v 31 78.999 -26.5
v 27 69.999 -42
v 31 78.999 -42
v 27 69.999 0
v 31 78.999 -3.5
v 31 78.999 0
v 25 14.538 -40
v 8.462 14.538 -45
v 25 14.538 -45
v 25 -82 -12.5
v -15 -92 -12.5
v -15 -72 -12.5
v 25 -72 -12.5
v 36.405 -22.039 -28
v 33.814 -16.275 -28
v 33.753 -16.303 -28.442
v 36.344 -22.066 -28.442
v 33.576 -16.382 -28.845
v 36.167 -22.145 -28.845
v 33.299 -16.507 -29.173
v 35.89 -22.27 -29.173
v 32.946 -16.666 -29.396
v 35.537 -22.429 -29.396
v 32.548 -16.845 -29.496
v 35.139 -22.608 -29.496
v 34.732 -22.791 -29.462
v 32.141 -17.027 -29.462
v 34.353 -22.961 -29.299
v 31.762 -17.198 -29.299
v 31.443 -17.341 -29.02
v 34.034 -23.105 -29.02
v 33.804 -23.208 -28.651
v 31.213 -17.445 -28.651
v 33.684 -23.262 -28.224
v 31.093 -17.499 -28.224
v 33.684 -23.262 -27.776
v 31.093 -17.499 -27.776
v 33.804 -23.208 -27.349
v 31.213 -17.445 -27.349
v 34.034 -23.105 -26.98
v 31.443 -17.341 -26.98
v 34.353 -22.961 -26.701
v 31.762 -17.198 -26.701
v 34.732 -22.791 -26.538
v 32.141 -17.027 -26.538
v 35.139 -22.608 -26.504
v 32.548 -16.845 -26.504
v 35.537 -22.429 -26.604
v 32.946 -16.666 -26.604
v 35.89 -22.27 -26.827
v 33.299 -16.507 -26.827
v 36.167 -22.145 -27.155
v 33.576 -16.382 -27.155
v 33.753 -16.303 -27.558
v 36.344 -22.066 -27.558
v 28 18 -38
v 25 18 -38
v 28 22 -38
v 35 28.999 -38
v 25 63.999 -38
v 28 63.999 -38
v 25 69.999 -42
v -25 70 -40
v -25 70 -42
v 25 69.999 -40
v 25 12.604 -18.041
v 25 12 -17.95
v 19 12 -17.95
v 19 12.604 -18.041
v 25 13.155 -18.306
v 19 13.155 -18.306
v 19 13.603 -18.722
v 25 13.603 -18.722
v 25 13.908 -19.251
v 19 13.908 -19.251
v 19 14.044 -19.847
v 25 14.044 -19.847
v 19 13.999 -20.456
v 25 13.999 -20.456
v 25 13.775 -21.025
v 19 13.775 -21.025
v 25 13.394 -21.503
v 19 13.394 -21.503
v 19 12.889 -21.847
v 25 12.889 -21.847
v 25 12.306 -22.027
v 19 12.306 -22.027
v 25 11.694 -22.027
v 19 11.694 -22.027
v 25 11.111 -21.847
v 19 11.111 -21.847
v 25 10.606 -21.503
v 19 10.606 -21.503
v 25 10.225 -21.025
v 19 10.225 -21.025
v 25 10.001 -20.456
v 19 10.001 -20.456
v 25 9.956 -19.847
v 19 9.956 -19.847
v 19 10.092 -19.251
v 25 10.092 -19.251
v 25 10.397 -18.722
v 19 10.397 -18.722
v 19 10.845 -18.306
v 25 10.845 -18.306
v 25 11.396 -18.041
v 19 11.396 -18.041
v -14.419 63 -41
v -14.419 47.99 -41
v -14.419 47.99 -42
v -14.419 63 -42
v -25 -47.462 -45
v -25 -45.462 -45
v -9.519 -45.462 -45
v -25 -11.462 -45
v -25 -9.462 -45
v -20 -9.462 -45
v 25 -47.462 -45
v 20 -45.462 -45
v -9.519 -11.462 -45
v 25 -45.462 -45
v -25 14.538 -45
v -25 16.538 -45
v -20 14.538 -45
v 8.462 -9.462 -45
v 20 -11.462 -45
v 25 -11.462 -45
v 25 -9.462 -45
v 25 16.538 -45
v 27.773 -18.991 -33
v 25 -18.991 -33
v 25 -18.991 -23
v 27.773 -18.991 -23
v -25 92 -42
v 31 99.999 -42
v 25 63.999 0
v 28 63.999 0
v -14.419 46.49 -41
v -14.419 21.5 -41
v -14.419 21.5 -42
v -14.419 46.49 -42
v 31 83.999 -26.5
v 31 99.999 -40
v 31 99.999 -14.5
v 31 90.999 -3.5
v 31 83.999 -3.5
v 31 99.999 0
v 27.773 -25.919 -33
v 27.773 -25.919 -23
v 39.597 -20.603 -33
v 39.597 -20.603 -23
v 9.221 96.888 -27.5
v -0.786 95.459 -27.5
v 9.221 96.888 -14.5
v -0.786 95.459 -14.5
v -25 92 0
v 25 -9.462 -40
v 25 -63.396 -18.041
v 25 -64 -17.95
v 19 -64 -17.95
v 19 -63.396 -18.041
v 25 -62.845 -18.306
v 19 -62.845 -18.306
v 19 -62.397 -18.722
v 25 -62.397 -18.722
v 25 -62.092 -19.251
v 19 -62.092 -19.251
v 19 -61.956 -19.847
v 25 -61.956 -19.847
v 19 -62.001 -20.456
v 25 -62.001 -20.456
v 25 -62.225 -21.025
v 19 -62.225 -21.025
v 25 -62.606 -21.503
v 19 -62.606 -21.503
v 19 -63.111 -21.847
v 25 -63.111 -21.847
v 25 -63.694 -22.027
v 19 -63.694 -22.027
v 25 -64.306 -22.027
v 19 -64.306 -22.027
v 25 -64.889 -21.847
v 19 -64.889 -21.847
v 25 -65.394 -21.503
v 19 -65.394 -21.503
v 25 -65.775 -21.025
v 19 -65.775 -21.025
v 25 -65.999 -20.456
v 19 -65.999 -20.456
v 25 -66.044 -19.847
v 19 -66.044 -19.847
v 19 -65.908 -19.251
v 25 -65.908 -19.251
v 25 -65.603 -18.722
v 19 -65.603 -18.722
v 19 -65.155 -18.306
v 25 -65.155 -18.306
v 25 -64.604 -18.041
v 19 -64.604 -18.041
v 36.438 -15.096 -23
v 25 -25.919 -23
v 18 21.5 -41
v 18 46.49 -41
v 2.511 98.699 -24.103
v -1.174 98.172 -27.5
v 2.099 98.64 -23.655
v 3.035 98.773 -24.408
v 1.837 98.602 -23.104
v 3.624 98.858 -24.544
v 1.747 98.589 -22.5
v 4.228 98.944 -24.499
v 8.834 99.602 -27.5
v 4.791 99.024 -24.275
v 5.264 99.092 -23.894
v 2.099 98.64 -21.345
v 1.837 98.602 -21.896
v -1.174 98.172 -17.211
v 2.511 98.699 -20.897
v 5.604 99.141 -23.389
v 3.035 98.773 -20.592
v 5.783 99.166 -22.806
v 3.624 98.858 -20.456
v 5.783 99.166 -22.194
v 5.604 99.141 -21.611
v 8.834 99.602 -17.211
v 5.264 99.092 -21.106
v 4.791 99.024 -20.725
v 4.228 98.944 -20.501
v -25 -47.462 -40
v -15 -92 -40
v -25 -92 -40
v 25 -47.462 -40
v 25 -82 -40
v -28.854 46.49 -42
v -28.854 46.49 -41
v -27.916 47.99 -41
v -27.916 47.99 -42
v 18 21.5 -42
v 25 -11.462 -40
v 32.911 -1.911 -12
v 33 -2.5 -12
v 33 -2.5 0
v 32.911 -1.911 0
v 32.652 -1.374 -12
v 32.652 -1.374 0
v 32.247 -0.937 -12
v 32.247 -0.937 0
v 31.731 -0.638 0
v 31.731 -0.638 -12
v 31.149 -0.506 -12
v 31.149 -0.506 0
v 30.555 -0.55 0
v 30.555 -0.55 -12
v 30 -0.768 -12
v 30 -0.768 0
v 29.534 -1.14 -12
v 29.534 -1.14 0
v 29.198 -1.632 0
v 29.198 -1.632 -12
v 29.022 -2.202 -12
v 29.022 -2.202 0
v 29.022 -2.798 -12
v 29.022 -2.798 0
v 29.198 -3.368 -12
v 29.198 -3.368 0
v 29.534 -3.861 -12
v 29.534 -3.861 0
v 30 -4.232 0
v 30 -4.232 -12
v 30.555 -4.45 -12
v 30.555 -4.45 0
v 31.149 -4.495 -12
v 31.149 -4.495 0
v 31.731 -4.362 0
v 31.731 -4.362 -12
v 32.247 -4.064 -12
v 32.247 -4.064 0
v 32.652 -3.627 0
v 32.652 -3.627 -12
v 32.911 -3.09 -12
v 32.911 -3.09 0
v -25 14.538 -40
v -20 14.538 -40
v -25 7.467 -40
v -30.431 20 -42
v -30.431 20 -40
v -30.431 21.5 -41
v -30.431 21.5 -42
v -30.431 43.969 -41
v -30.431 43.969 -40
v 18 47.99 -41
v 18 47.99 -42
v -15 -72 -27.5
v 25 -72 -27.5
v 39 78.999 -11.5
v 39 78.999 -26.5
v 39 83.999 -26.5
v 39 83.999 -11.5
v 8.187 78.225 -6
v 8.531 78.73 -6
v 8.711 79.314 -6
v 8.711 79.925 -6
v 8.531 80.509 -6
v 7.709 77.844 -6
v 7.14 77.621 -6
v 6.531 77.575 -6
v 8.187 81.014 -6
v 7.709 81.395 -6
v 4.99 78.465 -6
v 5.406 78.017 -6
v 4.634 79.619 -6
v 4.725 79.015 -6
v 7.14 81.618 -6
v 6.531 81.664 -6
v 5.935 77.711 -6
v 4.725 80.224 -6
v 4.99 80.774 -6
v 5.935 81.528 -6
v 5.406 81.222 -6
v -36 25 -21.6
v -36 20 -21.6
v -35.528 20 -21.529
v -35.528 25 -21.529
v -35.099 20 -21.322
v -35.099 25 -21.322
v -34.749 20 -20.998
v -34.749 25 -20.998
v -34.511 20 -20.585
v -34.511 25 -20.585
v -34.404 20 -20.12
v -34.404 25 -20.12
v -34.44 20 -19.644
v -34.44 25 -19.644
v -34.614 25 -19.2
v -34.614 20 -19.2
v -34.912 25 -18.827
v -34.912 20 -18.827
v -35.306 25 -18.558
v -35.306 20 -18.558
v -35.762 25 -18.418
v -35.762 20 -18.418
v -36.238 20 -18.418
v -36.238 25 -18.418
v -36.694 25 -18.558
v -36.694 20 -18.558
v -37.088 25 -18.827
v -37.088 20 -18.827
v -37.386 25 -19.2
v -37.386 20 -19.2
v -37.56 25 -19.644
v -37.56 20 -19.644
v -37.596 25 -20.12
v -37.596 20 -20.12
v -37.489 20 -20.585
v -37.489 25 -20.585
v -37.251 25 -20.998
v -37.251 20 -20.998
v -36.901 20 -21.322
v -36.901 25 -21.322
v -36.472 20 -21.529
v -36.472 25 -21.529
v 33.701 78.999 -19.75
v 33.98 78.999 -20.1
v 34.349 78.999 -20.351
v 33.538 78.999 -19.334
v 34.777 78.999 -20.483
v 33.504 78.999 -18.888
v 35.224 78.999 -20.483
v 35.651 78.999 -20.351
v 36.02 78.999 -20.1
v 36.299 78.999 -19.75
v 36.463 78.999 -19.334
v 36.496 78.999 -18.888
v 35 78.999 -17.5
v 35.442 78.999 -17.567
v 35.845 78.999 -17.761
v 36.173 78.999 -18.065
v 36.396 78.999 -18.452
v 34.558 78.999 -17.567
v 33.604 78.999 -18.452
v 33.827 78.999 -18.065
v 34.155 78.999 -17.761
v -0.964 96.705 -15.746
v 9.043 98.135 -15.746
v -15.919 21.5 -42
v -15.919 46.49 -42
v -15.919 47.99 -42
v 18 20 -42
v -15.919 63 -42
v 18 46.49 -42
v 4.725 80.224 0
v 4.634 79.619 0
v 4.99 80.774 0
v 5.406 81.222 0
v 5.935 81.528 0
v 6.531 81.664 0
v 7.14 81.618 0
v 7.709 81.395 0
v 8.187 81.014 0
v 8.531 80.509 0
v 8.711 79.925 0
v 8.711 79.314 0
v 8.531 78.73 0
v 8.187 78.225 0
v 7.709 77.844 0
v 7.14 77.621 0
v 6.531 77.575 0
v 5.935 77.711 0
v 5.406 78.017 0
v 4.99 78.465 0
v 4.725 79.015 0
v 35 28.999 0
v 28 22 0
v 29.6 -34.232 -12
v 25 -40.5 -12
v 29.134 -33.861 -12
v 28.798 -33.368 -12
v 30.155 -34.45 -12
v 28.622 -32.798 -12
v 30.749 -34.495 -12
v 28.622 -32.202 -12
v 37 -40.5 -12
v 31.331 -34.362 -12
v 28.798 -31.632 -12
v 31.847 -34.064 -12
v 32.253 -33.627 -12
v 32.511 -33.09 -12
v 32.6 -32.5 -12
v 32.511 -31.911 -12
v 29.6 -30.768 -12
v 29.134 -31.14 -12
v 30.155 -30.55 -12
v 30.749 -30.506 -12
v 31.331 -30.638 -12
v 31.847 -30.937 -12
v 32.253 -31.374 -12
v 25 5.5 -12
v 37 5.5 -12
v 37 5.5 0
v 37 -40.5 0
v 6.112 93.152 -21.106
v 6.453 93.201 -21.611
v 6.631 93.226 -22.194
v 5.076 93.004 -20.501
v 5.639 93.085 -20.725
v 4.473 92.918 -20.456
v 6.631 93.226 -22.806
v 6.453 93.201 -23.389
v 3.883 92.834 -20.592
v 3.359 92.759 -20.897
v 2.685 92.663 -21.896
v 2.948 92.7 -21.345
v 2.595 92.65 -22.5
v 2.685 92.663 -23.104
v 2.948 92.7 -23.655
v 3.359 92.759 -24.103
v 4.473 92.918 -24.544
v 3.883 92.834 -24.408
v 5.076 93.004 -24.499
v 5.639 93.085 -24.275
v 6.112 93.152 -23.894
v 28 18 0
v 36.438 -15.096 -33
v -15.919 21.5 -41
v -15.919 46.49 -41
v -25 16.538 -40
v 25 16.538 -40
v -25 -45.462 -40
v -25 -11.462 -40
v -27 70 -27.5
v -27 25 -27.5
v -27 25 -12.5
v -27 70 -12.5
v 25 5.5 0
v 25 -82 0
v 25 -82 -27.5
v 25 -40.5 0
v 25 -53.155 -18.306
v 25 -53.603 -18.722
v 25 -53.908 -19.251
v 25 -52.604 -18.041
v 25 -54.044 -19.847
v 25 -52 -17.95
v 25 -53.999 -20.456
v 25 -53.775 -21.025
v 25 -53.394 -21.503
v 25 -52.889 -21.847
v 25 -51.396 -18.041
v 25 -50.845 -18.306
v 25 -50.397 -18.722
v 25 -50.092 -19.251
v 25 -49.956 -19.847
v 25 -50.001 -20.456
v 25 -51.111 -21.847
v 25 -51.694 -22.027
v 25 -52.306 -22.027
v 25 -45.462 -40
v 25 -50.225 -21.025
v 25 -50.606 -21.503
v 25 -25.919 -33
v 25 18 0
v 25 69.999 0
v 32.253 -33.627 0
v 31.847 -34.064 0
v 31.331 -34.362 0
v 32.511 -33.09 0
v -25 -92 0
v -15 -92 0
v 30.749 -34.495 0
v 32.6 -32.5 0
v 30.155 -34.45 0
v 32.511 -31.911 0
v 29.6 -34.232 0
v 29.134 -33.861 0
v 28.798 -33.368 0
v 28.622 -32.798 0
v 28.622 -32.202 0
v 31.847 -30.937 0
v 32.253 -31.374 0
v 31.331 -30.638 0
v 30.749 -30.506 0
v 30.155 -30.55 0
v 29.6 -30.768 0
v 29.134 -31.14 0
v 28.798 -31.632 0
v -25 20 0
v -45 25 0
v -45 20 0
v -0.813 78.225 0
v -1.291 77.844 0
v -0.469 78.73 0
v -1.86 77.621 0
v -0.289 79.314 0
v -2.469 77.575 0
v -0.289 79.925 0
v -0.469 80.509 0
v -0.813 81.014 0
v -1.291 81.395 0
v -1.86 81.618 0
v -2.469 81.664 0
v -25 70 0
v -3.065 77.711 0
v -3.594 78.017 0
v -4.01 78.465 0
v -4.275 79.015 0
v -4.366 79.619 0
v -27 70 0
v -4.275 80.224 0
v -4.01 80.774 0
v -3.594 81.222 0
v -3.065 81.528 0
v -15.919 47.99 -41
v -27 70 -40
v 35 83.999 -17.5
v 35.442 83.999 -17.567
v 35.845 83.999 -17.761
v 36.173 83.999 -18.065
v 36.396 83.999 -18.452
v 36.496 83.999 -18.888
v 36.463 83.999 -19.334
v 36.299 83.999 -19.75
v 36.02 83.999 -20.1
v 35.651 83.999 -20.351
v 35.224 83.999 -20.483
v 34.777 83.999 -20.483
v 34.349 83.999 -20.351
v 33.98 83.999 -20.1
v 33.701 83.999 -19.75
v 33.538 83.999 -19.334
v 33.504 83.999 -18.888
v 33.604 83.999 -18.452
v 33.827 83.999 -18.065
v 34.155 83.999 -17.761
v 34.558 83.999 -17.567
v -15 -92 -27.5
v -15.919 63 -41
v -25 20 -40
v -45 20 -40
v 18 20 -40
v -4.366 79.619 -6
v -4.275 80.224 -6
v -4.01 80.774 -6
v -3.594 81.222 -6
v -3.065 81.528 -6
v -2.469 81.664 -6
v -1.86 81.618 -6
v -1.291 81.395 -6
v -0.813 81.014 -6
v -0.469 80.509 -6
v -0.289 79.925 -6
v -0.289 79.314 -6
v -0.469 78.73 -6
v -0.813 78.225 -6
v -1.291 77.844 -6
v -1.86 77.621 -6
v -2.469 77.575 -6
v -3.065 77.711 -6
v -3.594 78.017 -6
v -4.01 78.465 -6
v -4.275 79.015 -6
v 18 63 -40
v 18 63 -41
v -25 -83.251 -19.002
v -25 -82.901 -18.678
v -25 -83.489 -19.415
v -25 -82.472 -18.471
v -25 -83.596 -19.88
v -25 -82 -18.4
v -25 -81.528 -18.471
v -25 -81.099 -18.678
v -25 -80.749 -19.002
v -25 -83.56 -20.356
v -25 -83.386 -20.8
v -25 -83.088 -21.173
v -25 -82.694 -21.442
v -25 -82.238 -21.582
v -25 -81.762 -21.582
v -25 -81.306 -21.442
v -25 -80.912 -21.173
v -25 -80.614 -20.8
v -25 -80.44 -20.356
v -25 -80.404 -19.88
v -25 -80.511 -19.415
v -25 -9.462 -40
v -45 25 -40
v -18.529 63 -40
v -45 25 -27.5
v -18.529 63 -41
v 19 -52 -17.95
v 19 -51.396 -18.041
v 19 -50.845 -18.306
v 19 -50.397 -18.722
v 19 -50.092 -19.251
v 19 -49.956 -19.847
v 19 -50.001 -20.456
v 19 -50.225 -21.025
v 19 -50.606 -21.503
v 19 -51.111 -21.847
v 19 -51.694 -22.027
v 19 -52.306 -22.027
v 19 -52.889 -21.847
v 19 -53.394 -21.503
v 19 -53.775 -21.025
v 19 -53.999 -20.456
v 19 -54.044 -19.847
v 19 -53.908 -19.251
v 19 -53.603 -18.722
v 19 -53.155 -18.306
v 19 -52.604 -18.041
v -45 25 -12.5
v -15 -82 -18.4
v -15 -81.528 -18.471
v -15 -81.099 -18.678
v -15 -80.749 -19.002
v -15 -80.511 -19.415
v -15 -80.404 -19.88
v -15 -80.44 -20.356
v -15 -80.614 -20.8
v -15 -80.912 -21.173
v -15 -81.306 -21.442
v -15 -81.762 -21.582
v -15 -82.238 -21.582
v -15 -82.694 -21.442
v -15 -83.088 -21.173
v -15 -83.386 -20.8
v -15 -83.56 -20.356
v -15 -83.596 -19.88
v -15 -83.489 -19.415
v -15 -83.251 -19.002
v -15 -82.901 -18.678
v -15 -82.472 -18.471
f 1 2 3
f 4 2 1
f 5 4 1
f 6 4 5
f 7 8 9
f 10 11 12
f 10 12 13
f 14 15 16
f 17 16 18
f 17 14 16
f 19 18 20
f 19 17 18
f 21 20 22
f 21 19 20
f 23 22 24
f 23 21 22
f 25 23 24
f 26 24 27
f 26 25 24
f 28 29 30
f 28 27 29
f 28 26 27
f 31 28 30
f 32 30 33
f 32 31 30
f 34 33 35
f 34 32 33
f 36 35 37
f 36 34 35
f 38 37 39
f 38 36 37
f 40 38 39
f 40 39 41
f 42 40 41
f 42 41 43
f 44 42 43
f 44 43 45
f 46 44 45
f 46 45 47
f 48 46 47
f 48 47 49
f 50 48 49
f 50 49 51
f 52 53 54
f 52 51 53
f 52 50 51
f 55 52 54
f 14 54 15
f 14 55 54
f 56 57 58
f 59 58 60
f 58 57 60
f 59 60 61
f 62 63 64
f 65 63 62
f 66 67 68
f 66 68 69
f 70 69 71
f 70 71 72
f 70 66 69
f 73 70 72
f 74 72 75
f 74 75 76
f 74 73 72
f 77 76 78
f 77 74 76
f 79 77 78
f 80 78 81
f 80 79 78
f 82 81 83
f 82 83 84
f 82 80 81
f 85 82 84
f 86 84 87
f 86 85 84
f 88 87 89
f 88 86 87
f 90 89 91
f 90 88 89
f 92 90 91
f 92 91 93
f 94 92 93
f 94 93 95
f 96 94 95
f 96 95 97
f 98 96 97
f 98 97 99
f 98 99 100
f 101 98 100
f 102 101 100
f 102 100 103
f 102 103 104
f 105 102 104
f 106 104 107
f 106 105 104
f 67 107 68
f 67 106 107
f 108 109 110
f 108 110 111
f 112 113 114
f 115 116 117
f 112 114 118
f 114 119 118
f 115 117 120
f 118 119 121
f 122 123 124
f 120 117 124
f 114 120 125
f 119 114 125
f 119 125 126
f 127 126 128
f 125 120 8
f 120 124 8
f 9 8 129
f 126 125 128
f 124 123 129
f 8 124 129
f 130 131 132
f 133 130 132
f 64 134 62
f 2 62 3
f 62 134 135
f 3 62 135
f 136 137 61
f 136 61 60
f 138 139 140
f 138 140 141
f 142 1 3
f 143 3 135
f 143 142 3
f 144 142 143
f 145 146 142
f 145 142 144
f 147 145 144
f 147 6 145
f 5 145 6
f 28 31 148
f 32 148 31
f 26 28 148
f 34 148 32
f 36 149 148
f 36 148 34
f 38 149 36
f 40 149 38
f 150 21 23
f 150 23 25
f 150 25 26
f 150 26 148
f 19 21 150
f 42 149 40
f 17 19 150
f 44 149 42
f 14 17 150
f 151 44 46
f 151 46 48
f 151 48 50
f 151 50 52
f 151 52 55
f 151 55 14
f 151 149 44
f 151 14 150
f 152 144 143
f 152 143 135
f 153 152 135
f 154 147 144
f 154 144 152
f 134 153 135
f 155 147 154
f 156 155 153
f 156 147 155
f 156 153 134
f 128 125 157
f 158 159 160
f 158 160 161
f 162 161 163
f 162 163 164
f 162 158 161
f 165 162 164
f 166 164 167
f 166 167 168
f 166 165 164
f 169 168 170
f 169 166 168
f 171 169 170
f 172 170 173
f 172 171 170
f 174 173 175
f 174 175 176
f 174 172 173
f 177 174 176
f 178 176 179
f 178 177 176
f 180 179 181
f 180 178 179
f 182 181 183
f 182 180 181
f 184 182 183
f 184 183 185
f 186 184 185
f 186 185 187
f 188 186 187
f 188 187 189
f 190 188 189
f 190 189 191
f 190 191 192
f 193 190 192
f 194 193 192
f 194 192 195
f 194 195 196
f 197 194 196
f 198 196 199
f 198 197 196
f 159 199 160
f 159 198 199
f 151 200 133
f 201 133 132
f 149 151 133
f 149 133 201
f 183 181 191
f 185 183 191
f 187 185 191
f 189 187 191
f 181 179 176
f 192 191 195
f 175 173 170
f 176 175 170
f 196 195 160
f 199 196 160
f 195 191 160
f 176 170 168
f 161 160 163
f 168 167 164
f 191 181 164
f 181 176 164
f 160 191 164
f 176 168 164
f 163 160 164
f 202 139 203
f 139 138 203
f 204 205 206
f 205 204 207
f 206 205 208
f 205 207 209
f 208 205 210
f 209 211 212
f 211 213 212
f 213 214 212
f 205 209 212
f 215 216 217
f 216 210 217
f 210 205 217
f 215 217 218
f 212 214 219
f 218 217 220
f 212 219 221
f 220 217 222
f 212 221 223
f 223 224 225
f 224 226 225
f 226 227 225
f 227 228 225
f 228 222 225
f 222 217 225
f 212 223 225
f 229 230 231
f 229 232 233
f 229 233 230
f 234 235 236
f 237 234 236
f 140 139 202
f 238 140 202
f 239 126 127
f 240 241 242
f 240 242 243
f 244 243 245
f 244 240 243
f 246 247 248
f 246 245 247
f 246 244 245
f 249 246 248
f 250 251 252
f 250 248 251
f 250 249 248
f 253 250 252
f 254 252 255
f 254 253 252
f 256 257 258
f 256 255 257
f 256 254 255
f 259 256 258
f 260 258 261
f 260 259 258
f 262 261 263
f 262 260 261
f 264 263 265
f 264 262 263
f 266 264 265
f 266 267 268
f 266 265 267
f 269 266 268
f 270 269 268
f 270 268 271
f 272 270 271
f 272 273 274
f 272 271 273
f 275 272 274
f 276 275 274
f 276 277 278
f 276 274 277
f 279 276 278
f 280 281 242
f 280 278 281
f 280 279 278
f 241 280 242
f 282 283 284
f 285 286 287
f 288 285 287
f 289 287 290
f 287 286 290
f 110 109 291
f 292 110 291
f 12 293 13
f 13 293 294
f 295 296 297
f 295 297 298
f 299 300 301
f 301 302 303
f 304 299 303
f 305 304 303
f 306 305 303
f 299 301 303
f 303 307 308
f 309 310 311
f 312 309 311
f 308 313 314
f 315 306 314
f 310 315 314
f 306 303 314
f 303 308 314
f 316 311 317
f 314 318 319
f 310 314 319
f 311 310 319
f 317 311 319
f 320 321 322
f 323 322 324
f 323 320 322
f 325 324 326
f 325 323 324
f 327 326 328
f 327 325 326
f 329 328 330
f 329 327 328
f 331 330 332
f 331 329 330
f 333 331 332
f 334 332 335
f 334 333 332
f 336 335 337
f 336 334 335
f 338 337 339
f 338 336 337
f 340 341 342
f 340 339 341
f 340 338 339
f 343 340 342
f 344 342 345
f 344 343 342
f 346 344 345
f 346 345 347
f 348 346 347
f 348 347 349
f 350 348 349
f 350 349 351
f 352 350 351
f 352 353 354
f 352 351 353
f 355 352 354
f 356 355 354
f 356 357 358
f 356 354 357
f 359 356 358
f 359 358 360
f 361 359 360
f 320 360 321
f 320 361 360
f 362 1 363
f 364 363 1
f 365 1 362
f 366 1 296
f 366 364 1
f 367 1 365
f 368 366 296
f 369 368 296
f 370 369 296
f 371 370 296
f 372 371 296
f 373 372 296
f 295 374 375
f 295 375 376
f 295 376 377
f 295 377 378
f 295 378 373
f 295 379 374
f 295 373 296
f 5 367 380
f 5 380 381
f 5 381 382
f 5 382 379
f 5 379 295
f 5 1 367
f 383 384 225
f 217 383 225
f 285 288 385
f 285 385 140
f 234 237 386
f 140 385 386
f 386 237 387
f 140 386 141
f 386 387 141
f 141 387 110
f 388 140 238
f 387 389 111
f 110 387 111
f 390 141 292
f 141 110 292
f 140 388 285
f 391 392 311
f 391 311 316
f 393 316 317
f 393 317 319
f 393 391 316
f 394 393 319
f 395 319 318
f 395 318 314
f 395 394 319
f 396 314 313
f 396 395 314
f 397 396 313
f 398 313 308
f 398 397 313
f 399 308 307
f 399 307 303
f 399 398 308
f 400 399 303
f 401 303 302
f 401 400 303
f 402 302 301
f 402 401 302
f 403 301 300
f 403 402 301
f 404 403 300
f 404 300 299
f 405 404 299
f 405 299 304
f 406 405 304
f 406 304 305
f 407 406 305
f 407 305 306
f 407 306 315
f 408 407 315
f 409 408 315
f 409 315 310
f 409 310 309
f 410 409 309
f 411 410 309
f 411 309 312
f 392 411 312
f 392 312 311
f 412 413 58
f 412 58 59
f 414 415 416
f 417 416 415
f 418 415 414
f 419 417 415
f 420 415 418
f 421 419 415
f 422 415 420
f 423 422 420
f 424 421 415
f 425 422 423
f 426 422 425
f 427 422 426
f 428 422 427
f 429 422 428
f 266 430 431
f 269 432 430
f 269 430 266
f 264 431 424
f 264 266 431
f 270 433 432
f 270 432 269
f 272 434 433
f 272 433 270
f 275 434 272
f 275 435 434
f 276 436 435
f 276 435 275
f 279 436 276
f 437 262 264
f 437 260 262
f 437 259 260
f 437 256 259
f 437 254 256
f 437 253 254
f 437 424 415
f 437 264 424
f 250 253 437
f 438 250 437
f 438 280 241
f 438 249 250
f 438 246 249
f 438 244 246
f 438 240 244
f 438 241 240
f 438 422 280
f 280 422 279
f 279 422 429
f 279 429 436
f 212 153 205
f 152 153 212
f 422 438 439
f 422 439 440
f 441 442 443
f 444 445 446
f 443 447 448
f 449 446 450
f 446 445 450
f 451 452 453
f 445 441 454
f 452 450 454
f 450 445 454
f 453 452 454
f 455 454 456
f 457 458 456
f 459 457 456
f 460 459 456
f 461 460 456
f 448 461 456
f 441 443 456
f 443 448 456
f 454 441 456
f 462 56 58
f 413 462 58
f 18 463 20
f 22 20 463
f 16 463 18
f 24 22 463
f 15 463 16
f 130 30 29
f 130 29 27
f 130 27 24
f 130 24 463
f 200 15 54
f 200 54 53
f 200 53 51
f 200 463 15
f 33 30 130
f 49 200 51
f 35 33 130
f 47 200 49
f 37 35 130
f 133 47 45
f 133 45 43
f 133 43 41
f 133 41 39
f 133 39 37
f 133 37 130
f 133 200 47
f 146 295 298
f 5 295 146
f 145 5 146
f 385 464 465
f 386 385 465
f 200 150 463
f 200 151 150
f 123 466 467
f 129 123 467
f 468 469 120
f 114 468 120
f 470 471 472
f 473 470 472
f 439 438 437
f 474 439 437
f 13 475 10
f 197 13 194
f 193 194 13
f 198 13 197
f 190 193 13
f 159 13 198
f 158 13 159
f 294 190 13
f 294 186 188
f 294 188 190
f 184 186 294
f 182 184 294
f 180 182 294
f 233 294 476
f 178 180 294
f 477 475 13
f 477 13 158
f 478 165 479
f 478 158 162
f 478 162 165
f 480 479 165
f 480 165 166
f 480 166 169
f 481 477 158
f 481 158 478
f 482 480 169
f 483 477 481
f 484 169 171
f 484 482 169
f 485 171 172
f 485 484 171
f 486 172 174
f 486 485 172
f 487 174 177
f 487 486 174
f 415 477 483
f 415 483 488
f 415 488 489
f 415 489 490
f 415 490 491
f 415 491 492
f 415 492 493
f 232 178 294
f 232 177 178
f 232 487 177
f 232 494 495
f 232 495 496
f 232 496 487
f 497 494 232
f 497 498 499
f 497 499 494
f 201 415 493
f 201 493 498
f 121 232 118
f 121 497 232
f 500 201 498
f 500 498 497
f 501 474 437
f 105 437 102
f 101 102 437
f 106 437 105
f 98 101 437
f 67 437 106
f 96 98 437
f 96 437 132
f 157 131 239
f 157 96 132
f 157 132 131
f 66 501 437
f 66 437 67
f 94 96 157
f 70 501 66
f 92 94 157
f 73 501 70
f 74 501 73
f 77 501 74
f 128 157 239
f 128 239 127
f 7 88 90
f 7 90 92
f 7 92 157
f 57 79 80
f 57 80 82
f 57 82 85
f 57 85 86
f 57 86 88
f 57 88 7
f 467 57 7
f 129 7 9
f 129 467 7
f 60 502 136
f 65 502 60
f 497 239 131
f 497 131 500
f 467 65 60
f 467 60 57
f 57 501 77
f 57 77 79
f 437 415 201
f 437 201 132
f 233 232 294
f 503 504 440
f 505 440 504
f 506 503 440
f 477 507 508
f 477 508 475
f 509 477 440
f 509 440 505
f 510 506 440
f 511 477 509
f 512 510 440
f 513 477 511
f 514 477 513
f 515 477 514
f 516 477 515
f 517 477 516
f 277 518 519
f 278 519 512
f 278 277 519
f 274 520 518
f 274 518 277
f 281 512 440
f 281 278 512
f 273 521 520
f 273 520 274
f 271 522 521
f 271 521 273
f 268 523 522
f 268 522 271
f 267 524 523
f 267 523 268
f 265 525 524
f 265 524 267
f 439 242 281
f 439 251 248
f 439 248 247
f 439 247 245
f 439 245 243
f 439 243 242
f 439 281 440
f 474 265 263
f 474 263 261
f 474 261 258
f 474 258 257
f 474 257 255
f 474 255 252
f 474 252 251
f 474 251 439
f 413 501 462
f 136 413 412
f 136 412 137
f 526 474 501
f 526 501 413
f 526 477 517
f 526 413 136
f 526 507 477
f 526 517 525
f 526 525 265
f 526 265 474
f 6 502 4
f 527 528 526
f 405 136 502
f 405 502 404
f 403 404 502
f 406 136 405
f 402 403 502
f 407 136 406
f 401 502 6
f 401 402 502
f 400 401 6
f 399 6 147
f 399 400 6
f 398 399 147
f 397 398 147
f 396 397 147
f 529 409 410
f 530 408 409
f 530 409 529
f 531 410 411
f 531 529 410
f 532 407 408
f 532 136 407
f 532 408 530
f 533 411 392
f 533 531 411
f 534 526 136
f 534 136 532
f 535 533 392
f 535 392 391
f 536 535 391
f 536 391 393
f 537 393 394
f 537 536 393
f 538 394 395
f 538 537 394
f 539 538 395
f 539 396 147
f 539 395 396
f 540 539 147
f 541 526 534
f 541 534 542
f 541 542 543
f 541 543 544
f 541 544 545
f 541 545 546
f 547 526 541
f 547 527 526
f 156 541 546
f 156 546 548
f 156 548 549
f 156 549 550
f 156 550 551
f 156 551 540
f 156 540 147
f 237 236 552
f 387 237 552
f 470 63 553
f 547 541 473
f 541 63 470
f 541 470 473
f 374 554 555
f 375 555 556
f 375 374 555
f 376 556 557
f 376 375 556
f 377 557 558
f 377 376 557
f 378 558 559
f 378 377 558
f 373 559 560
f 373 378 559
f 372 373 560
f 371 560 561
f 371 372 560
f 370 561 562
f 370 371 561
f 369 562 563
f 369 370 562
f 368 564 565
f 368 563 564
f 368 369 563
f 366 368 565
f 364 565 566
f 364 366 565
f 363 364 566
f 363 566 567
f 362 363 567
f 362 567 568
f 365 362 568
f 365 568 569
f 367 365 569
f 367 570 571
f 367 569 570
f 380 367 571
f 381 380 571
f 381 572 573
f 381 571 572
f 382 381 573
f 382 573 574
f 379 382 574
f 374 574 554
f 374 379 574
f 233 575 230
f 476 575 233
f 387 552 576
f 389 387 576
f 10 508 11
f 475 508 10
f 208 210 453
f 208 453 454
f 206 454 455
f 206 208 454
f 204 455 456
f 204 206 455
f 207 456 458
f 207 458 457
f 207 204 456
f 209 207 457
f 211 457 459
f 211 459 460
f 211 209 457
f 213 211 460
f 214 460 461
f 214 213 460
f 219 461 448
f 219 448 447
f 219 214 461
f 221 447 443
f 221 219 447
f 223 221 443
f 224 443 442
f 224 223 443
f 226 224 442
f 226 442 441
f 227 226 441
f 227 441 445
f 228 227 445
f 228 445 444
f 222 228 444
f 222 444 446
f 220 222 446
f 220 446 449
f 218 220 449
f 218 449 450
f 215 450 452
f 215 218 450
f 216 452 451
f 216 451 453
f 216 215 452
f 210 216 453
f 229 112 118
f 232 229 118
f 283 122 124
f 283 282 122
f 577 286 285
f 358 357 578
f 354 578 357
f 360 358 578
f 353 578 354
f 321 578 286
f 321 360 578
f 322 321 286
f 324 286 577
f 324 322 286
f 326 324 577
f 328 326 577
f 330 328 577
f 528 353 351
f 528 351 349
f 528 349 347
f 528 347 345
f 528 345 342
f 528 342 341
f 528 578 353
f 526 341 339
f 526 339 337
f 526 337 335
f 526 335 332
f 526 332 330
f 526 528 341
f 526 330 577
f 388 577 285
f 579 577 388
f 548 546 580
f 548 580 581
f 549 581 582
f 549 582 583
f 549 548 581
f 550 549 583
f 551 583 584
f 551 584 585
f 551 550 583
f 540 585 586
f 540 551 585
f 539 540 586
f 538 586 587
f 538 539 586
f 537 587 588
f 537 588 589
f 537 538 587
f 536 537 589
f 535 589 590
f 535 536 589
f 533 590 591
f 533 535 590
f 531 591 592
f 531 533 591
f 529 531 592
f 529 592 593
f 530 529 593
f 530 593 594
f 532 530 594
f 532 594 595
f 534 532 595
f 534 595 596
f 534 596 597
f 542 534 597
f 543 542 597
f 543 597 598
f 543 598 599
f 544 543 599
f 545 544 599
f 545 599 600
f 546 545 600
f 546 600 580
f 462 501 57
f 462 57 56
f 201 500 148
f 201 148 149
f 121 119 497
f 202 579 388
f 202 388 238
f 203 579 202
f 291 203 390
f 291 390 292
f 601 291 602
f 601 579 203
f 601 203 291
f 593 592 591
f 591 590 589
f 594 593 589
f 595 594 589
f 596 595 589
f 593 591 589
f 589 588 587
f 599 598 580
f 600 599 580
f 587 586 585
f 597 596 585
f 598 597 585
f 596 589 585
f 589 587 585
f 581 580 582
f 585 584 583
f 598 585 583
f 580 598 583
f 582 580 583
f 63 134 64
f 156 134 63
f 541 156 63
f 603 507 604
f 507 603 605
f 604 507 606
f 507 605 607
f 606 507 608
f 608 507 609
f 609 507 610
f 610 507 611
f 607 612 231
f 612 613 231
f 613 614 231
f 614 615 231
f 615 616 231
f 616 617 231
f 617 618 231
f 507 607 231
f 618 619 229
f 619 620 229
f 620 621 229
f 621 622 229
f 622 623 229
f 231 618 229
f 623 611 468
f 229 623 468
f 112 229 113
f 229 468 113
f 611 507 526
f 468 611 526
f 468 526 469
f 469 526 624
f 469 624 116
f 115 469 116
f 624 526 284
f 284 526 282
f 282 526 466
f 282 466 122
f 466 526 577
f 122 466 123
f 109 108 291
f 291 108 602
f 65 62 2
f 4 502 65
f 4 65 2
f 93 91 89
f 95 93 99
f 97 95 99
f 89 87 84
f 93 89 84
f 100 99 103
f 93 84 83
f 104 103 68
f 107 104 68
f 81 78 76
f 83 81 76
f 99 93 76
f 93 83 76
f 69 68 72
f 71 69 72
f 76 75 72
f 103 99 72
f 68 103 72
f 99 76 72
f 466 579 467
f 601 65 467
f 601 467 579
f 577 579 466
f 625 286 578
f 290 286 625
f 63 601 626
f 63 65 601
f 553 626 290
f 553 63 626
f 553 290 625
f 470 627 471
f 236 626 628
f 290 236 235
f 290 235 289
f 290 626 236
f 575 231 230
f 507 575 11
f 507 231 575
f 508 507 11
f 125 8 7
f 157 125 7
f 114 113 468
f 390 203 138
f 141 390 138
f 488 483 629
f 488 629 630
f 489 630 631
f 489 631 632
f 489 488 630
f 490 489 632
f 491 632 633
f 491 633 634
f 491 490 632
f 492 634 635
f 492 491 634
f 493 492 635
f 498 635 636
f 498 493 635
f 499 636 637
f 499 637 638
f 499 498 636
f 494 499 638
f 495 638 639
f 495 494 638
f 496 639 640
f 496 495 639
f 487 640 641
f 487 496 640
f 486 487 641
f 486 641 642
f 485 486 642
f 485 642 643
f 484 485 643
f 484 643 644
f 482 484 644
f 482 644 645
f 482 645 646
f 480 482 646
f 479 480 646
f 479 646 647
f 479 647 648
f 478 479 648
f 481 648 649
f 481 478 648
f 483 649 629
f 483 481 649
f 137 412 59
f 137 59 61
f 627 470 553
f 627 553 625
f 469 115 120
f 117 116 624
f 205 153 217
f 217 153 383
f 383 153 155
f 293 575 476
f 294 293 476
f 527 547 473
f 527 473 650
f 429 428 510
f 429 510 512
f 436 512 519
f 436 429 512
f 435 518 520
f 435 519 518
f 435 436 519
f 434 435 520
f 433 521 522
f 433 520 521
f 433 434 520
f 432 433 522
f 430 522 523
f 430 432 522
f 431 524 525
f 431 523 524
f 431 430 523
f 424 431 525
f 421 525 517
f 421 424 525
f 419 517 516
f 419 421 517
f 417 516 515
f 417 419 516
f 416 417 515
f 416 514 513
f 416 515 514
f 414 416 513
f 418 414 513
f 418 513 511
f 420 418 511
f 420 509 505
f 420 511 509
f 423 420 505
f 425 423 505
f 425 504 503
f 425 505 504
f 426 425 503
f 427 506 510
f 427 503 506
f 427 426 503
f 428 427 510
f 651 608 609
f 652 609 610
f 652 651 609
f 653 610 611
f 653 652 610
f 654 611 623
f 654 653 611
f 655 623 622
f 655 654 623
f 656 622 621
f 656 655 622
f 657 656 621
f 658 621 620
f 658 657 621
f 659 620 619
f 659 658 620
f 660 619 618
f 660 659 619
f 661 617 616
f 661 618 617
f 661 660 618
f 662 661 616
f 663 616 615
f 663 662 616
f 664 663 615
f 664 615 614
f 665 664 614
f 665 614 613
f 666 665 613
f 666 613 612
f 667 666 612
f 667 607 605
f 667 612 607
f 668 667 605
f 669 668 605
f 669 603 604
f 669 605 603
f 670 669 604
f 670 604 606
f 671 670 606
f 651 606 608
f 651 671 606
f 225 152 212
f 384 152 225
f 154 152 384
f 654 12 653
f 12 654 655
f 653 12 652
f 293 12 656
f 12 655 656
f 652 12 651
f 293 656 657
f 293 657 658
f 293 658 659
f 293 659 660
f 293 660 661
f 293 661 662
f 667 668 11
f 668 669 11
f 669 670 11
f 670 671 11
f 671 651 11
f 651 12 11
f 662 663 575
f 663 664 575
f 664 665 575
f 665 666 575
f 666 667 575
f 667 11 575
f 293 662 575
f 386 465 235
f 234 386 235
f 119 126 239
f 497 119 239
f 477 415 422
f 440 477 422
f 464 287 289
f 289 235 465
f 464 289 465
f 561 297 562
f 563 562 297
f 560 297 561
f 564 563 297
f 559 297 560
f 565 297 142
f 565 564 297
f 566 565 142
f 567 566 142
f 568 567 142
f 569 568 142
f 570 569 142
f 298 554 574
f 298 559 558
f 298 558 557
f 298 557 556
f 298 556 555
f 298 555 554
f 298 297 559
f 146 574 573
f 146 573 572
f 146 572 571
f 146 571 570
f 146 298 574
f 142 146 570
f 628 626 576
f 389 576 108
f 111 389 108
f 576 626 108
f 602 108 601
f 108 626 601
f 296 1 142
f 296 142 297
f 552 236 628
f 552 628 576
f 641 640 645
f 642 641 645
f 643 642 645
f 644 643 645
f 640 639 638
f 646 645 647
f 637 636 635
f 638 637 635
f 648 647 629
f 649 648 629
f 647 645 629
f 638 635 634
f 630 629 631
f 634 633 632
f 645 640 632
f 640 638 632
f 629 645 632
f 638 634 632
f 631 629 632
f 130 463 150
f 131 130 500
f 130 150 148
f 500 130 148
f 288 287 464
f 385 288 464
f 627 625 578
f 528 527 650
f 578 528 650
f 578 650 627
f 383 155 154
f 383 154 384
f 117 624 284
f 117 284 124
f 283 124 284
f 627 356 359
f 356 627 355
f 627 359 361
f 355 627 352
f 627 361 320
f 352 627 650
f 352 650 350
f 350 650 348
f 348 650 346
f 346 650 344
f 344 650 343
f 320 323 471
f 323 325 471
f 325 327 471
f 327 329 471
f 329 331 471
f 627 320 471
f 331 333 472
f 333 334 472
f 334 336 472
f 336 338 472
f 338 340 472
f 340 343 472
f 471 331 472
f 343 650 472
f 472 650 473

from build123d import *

# Parameters (mm, degrees)
CROQUIS1_W                  = 50
CROQUIS1_H                  = 184
SALIENTE_EXTRUIR1_DEPTH     = 40
CORTAR_EXTRUIR1_DEPTH       = 40
CROQUIS3_R                  = 2
SALIENTE_EXTRUIR2_DEPTH     = 40
SALIENTE_EXTRUIR3_DEPTH     = 38
SALIENTE_EXTRUIR4_DEPTH     = 40
CROQUIS9_W                  = 28
CROQUIS9_H                  = 46
CORTAR_EXTRUIR6_DEPTH       = 12
CORTAR_EXTRUIR8_DEPTH       = 12
CROQUIS13_W                 = 3.499793878
CROQUIS13_H                 = 12
SALIENTE_EXTRUIR5_DEPTH     = 12
CROQUIS14_R                 = 1.5
CORTAR_EXTRUIR9_DEPTH       = 12
CROQUIS16_W                 = 10
CROQUIS16_H                 = 6.928
SALIENTE_EXTRUIR6_DEPTH     = 2.773
SALIENTE_EXTRUIR7_DEPTH     = 5
CROQUIS19_R                 = 1.5
CORTAR_EXTRUIR10_DEPTH      = 10
CROQUIS20_W                 = 40
CROQUIS20_H                 = 15
CORTAR_EXTRUIR11_DEPTH      = 20
SALIENTE_EXTRUIR8_DEPTH     = 40
SALIENTE_EXTRUIR9_DEPTH     = 40
SALIENTE_EXTRUIR10_DEPTH    = 2
CROQUIS25_W                 = 18
CROQUIS25_H                 = 15
CORTAR_EXTRUIR12_DEPTH      = 45
CROQUIS26_R                 = 1.6
CORTAR_EXTRUIR13_DEPTH      = 45
SALIENTE_EXTRUIR11_DEPTH    = 1
CROQUIS29_W                 = 48.431
CROQUIS29_H                 = 1.5
CROQUIS29_W_2               = 1.5
CROQUIS29_H_2               = 41.5
SALIENTE_EXTRUIR12_DEPTH    = 1
CROQUIS30_W                 = 50
CROQUIS30_H                 = 2
SALIENTE_EXTRUIR13_DEPTH    = 5
SALIENTE_EXTRUIR14_DEPTH    = 24
CORTAR_EXTRUIR14_DEPTH      = 5
CROQUIS33_W                 = 50
CROQUIS33_H                 = 5
SALIENTE_EXTRUIR15_DEPTH    = 2
SALIENTE_EXTRUIR16_DEPTH    = 34
CROQUIS35_W                 = 50
CROQUIS35_H                 = 5
SALIENTE_EXTRUIR17_DEPTH    = 2
CROQUIS36_R                 = 1.6
CORTAR_EXTRUIR15_DEPTH      = 123.497795141
CROQUIS37_R                 = 2.05
CORTAR_EXTRUIR16_DEPTH      = 6
CROQUIS38_R                 = 2.05
CORTAR_EXTRUIR17_DEPTH      = 6
CROQUIS39_W                 = 10.109
CROQUIS39_H                 = 13
SALIENTE_EXTRUIR18_DEPTH    = 2.741
CORTAR_EXTRUIR18_DEPTH      = 123.414338069
CROQUIS42_R                 = 2.05
CORTAR_EXTRUIR19_DEPTH      = 6
CORTAR_EXTRUIR20_DEPTH      = 134.419994789
CORTAR_EXTRUIR20_DEPTH_BACK = 134.419994789
CROQUIS44_W                 = 64.640952058
CROQUIS44_H                 = 86.005379165
CORTAR_EXTRUIR21_DEPTH      = 134.419994789


with BuildPart() as part:
    # Croquis1 → Saliente-Extruir1 (new body)
    with BuildSketch(Plane.XY):
        Rectangle(CROQUIS1_W, CROQUIS1_H)
    saliente_extruir1 = extrude(amount=SALIENTE_EXTRUIR1_DEPTH)

    # Croquis2 → Cortar-Extruir1 (cut)
    with BuildSketch(Plane.XY.offset(40)):
        Polygon((-15, -92), (25, -82.000231953), (25, -92), align=None)
    cortar_extruir1 = extrude(amount=-CORTAR_EXTRUIR1_DEPTH, mode=Mode.SUBTRACT)

    # Croquis3 → Saliente-Extruir2 (add, through all)
    with BuildSketch(Plane.XY.offset(40)):
        Polygon((25, -40.500231953), (17.257871302, -40.500231953), (17.257871302, 5.499768047), (23, 5.499768047), (37, 5.499768047), (37, -40.500231953), align=None)
        with Locations((30.600037882, -32.500231953)):
            Circle(CROQUIS3_R, mode=Mode.SUBTRACT)
        with Locations((31, -2.500231953)):
            Circle(CROQUIS3_R, mode=Mode.SUBTRACT)
    saliente_extruir2 = extrude(amount=-SALIENTE_EXTRUIR2_DEPTH)

    # Croquis7 → Saliente-Extruir3 (add)
    with BuildSketch(Plane(origin=(0, 0, 0), x_dir=(-1, 0, 0), z_dir=(0, 0, -1))):
        Polygon((-25, 17.999768047), (-28, 17.999768047), (-28, 21.999768047), (-34.999650027, 28.999418074), (-27.999635566, 63.999275882), (-25, 63.999275882), align=None)
    saliente_extruir3 = extrude(amount=-SALIENTE_EXTRUIR3_DEPTH)

    # Croquis8 → Saliente-Extruir4 (add, through all)
    with BuildSketch(Plane(origin=(0, 0, 0), x_dir=(-1, 0, 0), z_dir=(0, 0, -1))):
        Polygon((-25, 69.999275882), (-27, 69.999275882), (-31.000138025, 78.999370147), (-42.314138025, 78.999370147), (-42.314138025, 83.999370147), (-31.000138025, 83.999370147), (-31.000138025, 92), (-25, 92), align=None)
    saliente_extruir4 = extrude(amount=-SALIENTE_EXTRUIR4_DEPTH)

    # Croquis9 → Cortar-Extruir6 (cut)
    with BuildSketch(Plane(origin=(37, 0, 0), x_dir=(0, 0, -1), z_dir=(1, 0, 0))):
        with Locations((-26, -17.500231953)):
            Rectangle(CROQUIS9_W, CROQUIS9_H)
    cortar_extruir6 = extrude(amount=-CORTAR_EXTRUIR6_DEPTH, mode=Mode.SUBTRACT)

    # Croquis10 → Cortar-Extruir8 (cut)
    with BuildSketch(Plane.XZ.offset(-78.999370147)):
        Polygon((31.000138025, 40), (31.000138025, 26.5), (39.000138025, 26.5), (39.000138025, 11.5), (30.999931903, 3.499793878), (31.000138025, 0), (42.314138025, 0), (42.314138025, 40), align=None)
    cortar_extruir8 = extrude(amount=-CORTAR_EXTRUIR8_DEPTH, mode=Mode.SUBTRACT)

    # Croquis13 → Saliente-Extruir5 (add)
    with BuildSketch(Plane(origin=(31.000138025, 0, 0), x_dir=(0, 0, -1), z_dir=(1, 0, 0))):
        with Locations((-1.749896939, 84.999370147)):
            Rectangle(CROQUIS13_W, CROQUIS13_H)
    saliente_extruir5 = extrude(amount=-SALIENTE_EXTRUIR5_DEPTH)

    # Croquis14 → Cortar-Extruir9 (cut)
    with BuildSketch(Plane.XZ.offset(-78.999370147)):
        with Locations(Location((35.000138025, 19, 0), (0, 0, 270))):
            Circle(CROQUIS14_R)
    cortar_extruir9 = extrude(amount=-CORTAR_EXTRUIR9_DEPTH, mode=Mode.SUBTRACT)

    # Croquis16 → Saliente-Extruir6 (add)
    with BuildSketch(Plane(origin=(25, 0, 0), x_dir=(0, 0, -1), z_dir=(1, 0, 0))):
        with Locations((-28, -22.455231953)):
            Rectangle(CROQUIS16_W, CROQUIS16_H)
    saliente_extruir6 = extrude(amount=SALIENTE_EXTRUIR6_DEPTH)

    # Croquis3D1 → Saliente-Extruir7 (add, symmetric)
    with BuildSketch(Plane(origin=(27.773, -25.919231953, 28), x_dir=(0.6249550138681161, 0.7806607654039639, 0), z_dir=(0, 0, -1))):
        Polygon((0, 0), (11.53931357, 5.90842943), (13.864409677, 0), (5.408417783, -4.329688336), align=None)
    saliente_extruir7 = extrude(amount=SALIENTE_EXTRUIR7_DEPTH, both=True)

    # Croquis19 → Cortar-Extruir10 (cut)
    with BuildSketch(Plane(origin=(14.363025456, -31.948019069, 0), x_dir=(0.9120665622973847, 0.41004217580516156, 0), z_dir=(0.4100421758051615, -0.9120665622973846, 0))):
        with Locations((22.66684637, 28)):
            Circle(CROQUIS19_R)
    cortar_extruir10 = extrude(amount=-CORTAR_EXTRUIR10_DEPTH, mode=Mode.SUBTRACT)

    # Croquis20 → Cortar-Extruir11 (cut)
    with BuildSketch(Plane.XZ.offset(92)):
        with Locations((5, 20)):
            Rectangle(CROQUIS20_W, CROQUIS20_H)
    cortar_extruir11 = extrude(amount=-CORTAR_EXTRUIR11_DEPTH, mode=Mode.SUBTRACT)

    # Croquis21 → Saliente-Extruir8 (add)
    with BuildSketch(Plane(origin=(0, 0, 0), x_dir=(-1, 0, 0), z_dir=(0, 0, -1))):
        Polygon((25, 70), (27, 70), (45, 25), (45, 20), (25, 20), align=None)
    saliente_extruir8 = extrude(amount=-SALIENTE_EXTRUIR8_DEPTH)

    # Croquis22 → Saliente-Extruir9 (add)
    with BuildSketch(Plane.XY.offset(40)):
        Polygon((-25, 92), (31.000138025, 99.999370147), (31.000138025, 92), align=None)
    saliente_extruir9 = extrude(amount=-SALIENTE_EXTRUIR9_DEPTH)

    # Croquis23 → Saliente-Extruir10 (add)
    with BuildSketch(Plane.XY.offset(40)):
        Polygon((-25, 70), (25, 69.999275882), (27, 69.999275882), (31.000138025, 78.999370147), (31.000138025, 99.999370147), (-25, 92), align=None)
    saliente_extruir10 = extrude(amount=SALIENTE_EXTRUIR10_DEPTH)

    # Croquis25 → Cortar-Extruir12 (cut)
    with BuildSketch(Plane(origin=(0, 70, 0), x_dir=(1, 0, 0), z_dir=(0, 1, 0))):
        with Locations((-36, -20)):
            Rectangle(CROQUIS25_W, CROQUIS25_H)
    cortar_extruir12 = extrude(amount=-CORTAR_EXTRUIR12_DEPTH, mode=Mode.SUBTRACT)

    # Croquis26 → Cortar-Extruir13 (cut)
    with BuildSketch(Plane(origin=(0, 25, 0), x_dir=(1, 0, 0), z_dir=(0, 1, 0))):
        with Locations(Location((-36, -20, 0), (0, 0, 270))):
            Circle(CROQUIS26_R)
    cortar_extruir13 = extrude(amount=-CORTAR_EXTRUIR13_DEPTH, mode=Mode.SUBTRACT)

    # Croquis28 → Saliente-Extruir11 (add)
    with BuildSketch(Plane.XY.offset(40)):
        Polygon((-30.431, 20), (18, 20), (18, 63), (-18.529, 63), (-30.431, 43.969), align=None)
    saliente_extruir11 = extrude(amount=SALIENTE_EXTRUIR11_DEPTH)

    # Croquis29 → Saliente-Extruir12 (add)
    with BuildSketch(Plane.XY.offset(41)):
        with Locations((-6.2155, 20.75)):
            Rectangle(CROQUIS29_W, CROQUIS29_H)
        with Locations((-15.169, 42.25)):
            Rectangle(CROQUIS29_W_2, CROQUIS29_H_2)
        Polygon((-15.919, 47.99), (18, 47.99), (18, 46.49), (-28.854364931, 46.49), (-27.916263938, 47.99), align=None)
    saliente_extruir12 = extrude(amount=SALIENTE_EXTRUIR12_DEPTH)

    # Croquis30 → Saliente-Extruir13 (add)
    with BuildSketch(Plane.XY.offset(40)):
        with Locations((0, 15.538)):
            Rectangle(CROQUIS30_W, CROQUIS30_H)
    saliente_extruir13 = extrude(amount=SALIENTE_EXTRUIR13_DEPTH)

    # Croquis31 → Saliente-Extruir14 (add)
    with BuildSketch(Plane.XZ.offset(-14.538)):
        Polygon((-25, 40), (-20.000095901, 45), (8.461904099, 45), (25, 40), align=None)
    saliente_extruir14 = extrude(amount=SALIENTE_EXTRUIR14_DEPTH)

    # Croquis32 → Cortar-Extruir14 (cut)
    with BuildSketch(Plane.XY.offset(45)):
        Polygon((-20.000095901, 14.538), (-25, 7.467175508), (-25, 14.538), align=None)
    cortar_extruir14 = extrude(amount=-CORTAR_EXTRUIR14_DEPTH, mode=Mode.SUBTRACT)

    # Croquis33 → Saliente-Extruir15 (add)
    with BuildSketch(Plane.XZ.offset(9.462)):
        with Locations((0, 42.5)):
            Rectangle(CROQUIS33_W, CROQUIS33_H)
    saliente_extruir15 = extrude(amount=SALIENTE_EXTRUIR15_DEPTH)

    # Croquis34 → Saliente-Extruir16 (add)
    with BuildSketch(Plane.XZ.offset(11.462)):
        Polygon((-25, 40), (-9.51943722, 45), (19.99956278, 45), (25, 40), align=None)
    saliente_extruir16 = extrude(amount=SALIENTE_EXTRUIR16_DEPTH)

    # Croquis35 → Saliente-Extruir17 (add)
    with BuildSketch(Plane.XZ.offset(45.462)):
        with Locations((0, 42.5)):
            Rectangle(CROQUIS35_W, CROQUIS35_H)
    saliente_extruir17 = extrude(amount=SALIENTE_EXTRUIR17_DEPTH)

    # Croquis36 → Cortar-Extruir15 (cut, through all)
    with BuildSketch(Plane(origin=(-15, 0, 0), x_dir=(0, 0, -1), z_dir=(1, 0, 0))):
        with Locations((-20, -82)):
            Circle(CROQUIS36_R)
    cortar_extruir15 = extrude(amount=-CORTAR_EXTRUIR15_DEPTH, mode=Mode.SUBTRACT)

    # Croquis37 → Cortar-Extruir16 (cut)
    with BuildSketch(Plane(origin=(25, 0, 0), x_dir=(0, 0, -1), z_dir=(1, 0, 0))):
        with Locations((-20, -64)):
            Circle(CROQUIS37_R)
        with Locations((-20, -52)):
            Circle(CROQUIS37_R)
        with Locations((-20, 12)):
            Circle(CROQUIS37_R)
    cortar_extruir16 = extrude(amount=-CORTAR_EXTRUIR16_DEPTH, mode=Mode.SUBTRACT)

    # Croquis38 → Cortar-Extruir17 (cut)
    with BuildSketch(Plane(origin=(0, 0, 0), x_dir=(-1, 0, 0), z_dir=(0, 0, -1))):
        with Locations((-6.684, 79.619334724)):
            Circle(CROQUIS38_R)
        with Locations((2.316, 79.619334724)):
            Circle(CROQUIS38_R)
    cortar_extruir17 = extrude(amount=-CORTAR_EXTRUIR17_DEPTH, mode=Mode.SUBTRACT)

    # Croquis39 → Saliente-Extruir18 (add)
    with BuildSketch(Plane(origin=(-13.378916452, 93.660019994, 0), x_dir=(0.9899511012015357, 0.14141010299786488, 0), z_dir=(-0.14141010299786488, 0.9899511012015357, 0))):
        with Locations((17.775042007, -21)):
            Rectangle(CROQUIS39_W, CROQUIS39_H)
    saliente_extruir18 = extrude(amount=SALIENTE_EXTRUIR18_DEPTH)

    # Croquis40 → Cortar-Extruir18 (cut, through all)
    with BuildSketch(Plane(origin=(12.592714568, 1.798813155, 0), x_dir=(0, 0, 1), z_dir=(-0.9899511012015357, -0.14141010299786488, 0))):
        Polygon((14.5, 94.610753885), (15.746, 95.869753885), (17.211, 97.351753885), (14.5, 97.351753885), align=None)
    cortar_extruir18 = extrude(amount=-CORTAR_EXTRUIR18_DEPTH, mode=Mode.SUBTRACT)

    # Croquis42 → Cortar-Extruir19 (cut)
    with BuildSketch(Plane(origin=(-13.766521544, 96.373475963, 0), x_dir=(0.9899511012015357, 0.14141010299786486, 0), z_dir=(-0.14141010299786486, 0.9899511012015357, 0))):
        with Locations(Location((17.720542007, -22.5, 0), (0, 0, 180))):
            Circle(CROQUIS42_R)
    cortar_extruir19 = extrude(amount=-CORTAR_EXTRUIR19_DEPTH, mode=Mode.SUBTRACT)

    # Simetría1: Saliente-Extruir1, Cortar-Extruir1, Saliente-Extruir2, Saliente-Extruir3, Saliente-Extruir4, Cortar-Extruir6, Cortar-Extruir8, Saliente-Extruir5, Cortar-Extruir9, Saliente-Extruir6, Saliente-Extruir7, Cortar-Extruir10, Cortar-Extruir11, Saliente-Extruir8, Saliente-Extruir9, Saliente-Extruir10, Cortar-Extruir12, Cortar-Extruir13, Saliente-Extruir11, Saliente-Extruir12, Saliente-Extruir13, Saliente-Extruir14, Cortar-Extruir14, Saliente-Extruir15, Saliente-Extruir16, Saliente-Extruir17, Cortar-Extruir15, Cortar-Extruir16, Cortar-Extruir17, Saliente-Extruir18, Cortar-Extruir18, Cortar-Extruir19 across plane
    add(saliente_extruir1.mirror(Plane(origin=(0, 0, 0), x_dir=(1, 0, 0), z_dir=(0, 0, -1))))
    add(cortar_extruir1.mirror(Plane(origin=(0, 0, 0), x_dir=(1, 0, 0), z_dir=(0, 0, -1))), mode=Mode.SUBTRACT)
    add(saliente_extruir2.mirror(Plane(origin=(0, 0, 0), x_dir=(1, 0, 0), z_dir=(0, 0, -1))))
    add(saliente_extruir3.mirror(Plane(origin=(0, 0, 0), x_dir=(1, 0, 0), z_dir=(0, 0, -1))))
    add(saliente_extruir4.mirror(Plane(origin=(0, 0, 0), x_dir=(1, 0, 0), z_dir=(0, 0, -1))))
    add(cortar_extruir6.mirror(Plane(origin=(0, 0, 0), x_dir=(1, 0, 0), z_dir=(0, 0, -1))), mode=Mode.SUBTRACT)
    add(cortar_extruir8.mirror(Plane(origin=(0, 0, 0), x_dir=(1, 0, 0), z_dir=(0, 0, -1))), mode=Mode.SUBTRACT)
    add(saliente_extruir5.mirror(Plane(origin=(0, 0, 0), x_dir=(1, 0, 0), z_dir=(0, 0, -1))))
    add(cortar_extruir9.mirror(Plane(origin=(0, 0, 0), x_dir=(1, 0, 0), z_dir=(0, 0, -1))), mode=Mode.SUBTRACT)
    add(saliente_extruir6.mirror(Plane(origin=(0, 0, 0), x_dir=(1, 0, 0), z_dir=(0, 0, -1))))
    add(saliente_extruir7.mirror(Plane(origin=(0, 0, 0), x_dir=(1, 0, 0), z_dir=(0, 0, -1))))
    add(cortar_extruir10.mirror(Plane(origin=(0, 0, 0), x_dir=(1, 0, 0), z_dir=(0, 0, -1))), mode=Mode.SUBTRACT)
    add(cortar_extruir11.mirror(Plane(origin=(0, 0, 0), x_dir=(1, 0, 0), z_dir=(0, 0, -1))), mode=Mode.SUBTRACT)
    add(saliente_extruir8.mirror(Plane(origin=(0, 0, 0), x_dir=(1, 0, 0), z_dir=(0, 0, -1))))
    add(saliente_extruir9.mirror(Plane(origin=(0, 0, 0), x_dir=(1, 0, 0), z_dir=(0, 0, -1))))
    add(saliente_extruir10.mirror(Plane(origin=(0, 0, 0), x_dir=(1, 0, 0), z_dir=(0, 0, -1))))
    add(cortar_extruir12.mirror(Plane(origin=(0, 0, 0), x_dir=(1, 0, 0), z_dir=(0, 0, -1))), mode=Mode.SUBTRACT)
    add(cortar_extruir13.mirror(Plane(origin=(0, 0, 0), x_dir=(1, 0, 0), z_dir=(0, 0, -1))), mode=Mode.SUBTRACT)
    add(saliente_extruir11.mirror(Plane(origin=(0, 0, 0), x_dir=(1, 0, 0), z_dir=(0, 0, -1))))
    add(saliente_extruir12.mirror(Plane(origin=(0, 0, 0), x_dir=(1, 0, 0), z_dir=(0, 0, -1))))
    add(saliente_extruir13.mirror(Plane(origin=(0, 0, 0), x_dir=(1, 0, 0), z_dir=(0, 0, -1))))
    add(saliente_extruir14.mirror(Plane(origin=(0, 0, 0), x_dir=(1, 0, 0), z_dir=(0, 0, -1))))
    add(cortar_extruir14.mirror(Plane(origin=(0, 0, 0), x_dir=(1, 0, 0), z_dir=(0, 0, -1))), mode=Mode.SUBTRACT)
    add(saliente_extruir15.mirror(Plane(origin=(0, 0, 0), x_dir=(1, 0, 0), z_dir=(0, 0, -1))))
    add(saliente_extruir16.mirror(Plane(origin=(0, 0, 0), x_dir=(1, 0, 0), z_dir=(0, 0, -1))))
    add(saliente_extruir17.mirror(Plane(origin=(0, 0, 0), x_dir=(1, 0, 0), z_dir=(0, 0, -1))))
    add(cortar_extruir15.mirror(Plane(origin=(0, 0, 0), x_dir=(1, 0, 0), z_dir=(0, 0, -1))), mode=Mode.SUBTRACT)
    add(cortar_extruir16.mirror(Plane(origin=(0, 0, 0), x_dir=(1, 0, 0), z_dir=(0, 0, -1))), mode=Mode.SUBTRACT)
    add(cortar_extruir17.mirror(Plane(origin=(0, 0, 0), x_dir=(1, 0, 0), z_dir=(0, 0, -1))), mode=Mode.SUBTRACT)
    add(saliente_extruir18.mirror(Plane(origin=(0, 0, 0), x_dir=(1, 0, 0), z_dir=(0, 0, -1))))
    add(cortar_extruir18.mirror(Plane(origin=(0, 0, 0), x_dir=(1, 0, 0), z_dir=(0, 0, -1))), mode=Mode.SUBTRACT)
    add(cortar_extruir19.mirror(Plane(origin=(0, 0, 0), x_dir=(1, 0, 0), z_dir=(0, 0, -1))), mode=Mode.SUBTRACT)

    # Croquis43 → Cortar-Extruir20 (cut, two sides: drawn at the far end of the back side and taken through both)
    with BuildSketch(Plane(origin=(31.000138025, 0, 0), x_dir=(0, 0, -1), z_dir=(1, 0, 0)).offset(-CORTAR_EXTRUIR20_DEPTH_BACK)):
        Polygon((0, -92), (0, 78.999370147), (-3.499793878, 78.999370147), (-3.499793878, 90.999370147), (-3.5, 90.999370147), (-3.5, 83.999370147), (-26.5, 83.999370147), (-26.5, 78.999370147), (-42, 78.999370147), (-42, 99.999370147), (-89.715915191, 99.999370147), (-89.715915191, -92), align=None)
    extrude(amount=CORTAR_EXTRUIR20_DEPTH + CORTAR_EXTRUIR20_DEPTH_BACK, mode=Mode.SUBTRACT)

    # Croquis44 → Cortar-Extruir21 (cut, through all)
    with BuildSketch(Plane(origin=(31.000138025, 0, 0), x_dir=(0, 0, -1), z_dir=(1, 0, 0))):
        with Locations((-32.320476029, 95.928740373)):
            Rectangle(CROQUIS44_W, CROQUIS44_H)
    extrude(amount=-CORTAR_EXTRUIR21_DEPTH, mode=Mode.SUBTRACT)


solid = part.part
